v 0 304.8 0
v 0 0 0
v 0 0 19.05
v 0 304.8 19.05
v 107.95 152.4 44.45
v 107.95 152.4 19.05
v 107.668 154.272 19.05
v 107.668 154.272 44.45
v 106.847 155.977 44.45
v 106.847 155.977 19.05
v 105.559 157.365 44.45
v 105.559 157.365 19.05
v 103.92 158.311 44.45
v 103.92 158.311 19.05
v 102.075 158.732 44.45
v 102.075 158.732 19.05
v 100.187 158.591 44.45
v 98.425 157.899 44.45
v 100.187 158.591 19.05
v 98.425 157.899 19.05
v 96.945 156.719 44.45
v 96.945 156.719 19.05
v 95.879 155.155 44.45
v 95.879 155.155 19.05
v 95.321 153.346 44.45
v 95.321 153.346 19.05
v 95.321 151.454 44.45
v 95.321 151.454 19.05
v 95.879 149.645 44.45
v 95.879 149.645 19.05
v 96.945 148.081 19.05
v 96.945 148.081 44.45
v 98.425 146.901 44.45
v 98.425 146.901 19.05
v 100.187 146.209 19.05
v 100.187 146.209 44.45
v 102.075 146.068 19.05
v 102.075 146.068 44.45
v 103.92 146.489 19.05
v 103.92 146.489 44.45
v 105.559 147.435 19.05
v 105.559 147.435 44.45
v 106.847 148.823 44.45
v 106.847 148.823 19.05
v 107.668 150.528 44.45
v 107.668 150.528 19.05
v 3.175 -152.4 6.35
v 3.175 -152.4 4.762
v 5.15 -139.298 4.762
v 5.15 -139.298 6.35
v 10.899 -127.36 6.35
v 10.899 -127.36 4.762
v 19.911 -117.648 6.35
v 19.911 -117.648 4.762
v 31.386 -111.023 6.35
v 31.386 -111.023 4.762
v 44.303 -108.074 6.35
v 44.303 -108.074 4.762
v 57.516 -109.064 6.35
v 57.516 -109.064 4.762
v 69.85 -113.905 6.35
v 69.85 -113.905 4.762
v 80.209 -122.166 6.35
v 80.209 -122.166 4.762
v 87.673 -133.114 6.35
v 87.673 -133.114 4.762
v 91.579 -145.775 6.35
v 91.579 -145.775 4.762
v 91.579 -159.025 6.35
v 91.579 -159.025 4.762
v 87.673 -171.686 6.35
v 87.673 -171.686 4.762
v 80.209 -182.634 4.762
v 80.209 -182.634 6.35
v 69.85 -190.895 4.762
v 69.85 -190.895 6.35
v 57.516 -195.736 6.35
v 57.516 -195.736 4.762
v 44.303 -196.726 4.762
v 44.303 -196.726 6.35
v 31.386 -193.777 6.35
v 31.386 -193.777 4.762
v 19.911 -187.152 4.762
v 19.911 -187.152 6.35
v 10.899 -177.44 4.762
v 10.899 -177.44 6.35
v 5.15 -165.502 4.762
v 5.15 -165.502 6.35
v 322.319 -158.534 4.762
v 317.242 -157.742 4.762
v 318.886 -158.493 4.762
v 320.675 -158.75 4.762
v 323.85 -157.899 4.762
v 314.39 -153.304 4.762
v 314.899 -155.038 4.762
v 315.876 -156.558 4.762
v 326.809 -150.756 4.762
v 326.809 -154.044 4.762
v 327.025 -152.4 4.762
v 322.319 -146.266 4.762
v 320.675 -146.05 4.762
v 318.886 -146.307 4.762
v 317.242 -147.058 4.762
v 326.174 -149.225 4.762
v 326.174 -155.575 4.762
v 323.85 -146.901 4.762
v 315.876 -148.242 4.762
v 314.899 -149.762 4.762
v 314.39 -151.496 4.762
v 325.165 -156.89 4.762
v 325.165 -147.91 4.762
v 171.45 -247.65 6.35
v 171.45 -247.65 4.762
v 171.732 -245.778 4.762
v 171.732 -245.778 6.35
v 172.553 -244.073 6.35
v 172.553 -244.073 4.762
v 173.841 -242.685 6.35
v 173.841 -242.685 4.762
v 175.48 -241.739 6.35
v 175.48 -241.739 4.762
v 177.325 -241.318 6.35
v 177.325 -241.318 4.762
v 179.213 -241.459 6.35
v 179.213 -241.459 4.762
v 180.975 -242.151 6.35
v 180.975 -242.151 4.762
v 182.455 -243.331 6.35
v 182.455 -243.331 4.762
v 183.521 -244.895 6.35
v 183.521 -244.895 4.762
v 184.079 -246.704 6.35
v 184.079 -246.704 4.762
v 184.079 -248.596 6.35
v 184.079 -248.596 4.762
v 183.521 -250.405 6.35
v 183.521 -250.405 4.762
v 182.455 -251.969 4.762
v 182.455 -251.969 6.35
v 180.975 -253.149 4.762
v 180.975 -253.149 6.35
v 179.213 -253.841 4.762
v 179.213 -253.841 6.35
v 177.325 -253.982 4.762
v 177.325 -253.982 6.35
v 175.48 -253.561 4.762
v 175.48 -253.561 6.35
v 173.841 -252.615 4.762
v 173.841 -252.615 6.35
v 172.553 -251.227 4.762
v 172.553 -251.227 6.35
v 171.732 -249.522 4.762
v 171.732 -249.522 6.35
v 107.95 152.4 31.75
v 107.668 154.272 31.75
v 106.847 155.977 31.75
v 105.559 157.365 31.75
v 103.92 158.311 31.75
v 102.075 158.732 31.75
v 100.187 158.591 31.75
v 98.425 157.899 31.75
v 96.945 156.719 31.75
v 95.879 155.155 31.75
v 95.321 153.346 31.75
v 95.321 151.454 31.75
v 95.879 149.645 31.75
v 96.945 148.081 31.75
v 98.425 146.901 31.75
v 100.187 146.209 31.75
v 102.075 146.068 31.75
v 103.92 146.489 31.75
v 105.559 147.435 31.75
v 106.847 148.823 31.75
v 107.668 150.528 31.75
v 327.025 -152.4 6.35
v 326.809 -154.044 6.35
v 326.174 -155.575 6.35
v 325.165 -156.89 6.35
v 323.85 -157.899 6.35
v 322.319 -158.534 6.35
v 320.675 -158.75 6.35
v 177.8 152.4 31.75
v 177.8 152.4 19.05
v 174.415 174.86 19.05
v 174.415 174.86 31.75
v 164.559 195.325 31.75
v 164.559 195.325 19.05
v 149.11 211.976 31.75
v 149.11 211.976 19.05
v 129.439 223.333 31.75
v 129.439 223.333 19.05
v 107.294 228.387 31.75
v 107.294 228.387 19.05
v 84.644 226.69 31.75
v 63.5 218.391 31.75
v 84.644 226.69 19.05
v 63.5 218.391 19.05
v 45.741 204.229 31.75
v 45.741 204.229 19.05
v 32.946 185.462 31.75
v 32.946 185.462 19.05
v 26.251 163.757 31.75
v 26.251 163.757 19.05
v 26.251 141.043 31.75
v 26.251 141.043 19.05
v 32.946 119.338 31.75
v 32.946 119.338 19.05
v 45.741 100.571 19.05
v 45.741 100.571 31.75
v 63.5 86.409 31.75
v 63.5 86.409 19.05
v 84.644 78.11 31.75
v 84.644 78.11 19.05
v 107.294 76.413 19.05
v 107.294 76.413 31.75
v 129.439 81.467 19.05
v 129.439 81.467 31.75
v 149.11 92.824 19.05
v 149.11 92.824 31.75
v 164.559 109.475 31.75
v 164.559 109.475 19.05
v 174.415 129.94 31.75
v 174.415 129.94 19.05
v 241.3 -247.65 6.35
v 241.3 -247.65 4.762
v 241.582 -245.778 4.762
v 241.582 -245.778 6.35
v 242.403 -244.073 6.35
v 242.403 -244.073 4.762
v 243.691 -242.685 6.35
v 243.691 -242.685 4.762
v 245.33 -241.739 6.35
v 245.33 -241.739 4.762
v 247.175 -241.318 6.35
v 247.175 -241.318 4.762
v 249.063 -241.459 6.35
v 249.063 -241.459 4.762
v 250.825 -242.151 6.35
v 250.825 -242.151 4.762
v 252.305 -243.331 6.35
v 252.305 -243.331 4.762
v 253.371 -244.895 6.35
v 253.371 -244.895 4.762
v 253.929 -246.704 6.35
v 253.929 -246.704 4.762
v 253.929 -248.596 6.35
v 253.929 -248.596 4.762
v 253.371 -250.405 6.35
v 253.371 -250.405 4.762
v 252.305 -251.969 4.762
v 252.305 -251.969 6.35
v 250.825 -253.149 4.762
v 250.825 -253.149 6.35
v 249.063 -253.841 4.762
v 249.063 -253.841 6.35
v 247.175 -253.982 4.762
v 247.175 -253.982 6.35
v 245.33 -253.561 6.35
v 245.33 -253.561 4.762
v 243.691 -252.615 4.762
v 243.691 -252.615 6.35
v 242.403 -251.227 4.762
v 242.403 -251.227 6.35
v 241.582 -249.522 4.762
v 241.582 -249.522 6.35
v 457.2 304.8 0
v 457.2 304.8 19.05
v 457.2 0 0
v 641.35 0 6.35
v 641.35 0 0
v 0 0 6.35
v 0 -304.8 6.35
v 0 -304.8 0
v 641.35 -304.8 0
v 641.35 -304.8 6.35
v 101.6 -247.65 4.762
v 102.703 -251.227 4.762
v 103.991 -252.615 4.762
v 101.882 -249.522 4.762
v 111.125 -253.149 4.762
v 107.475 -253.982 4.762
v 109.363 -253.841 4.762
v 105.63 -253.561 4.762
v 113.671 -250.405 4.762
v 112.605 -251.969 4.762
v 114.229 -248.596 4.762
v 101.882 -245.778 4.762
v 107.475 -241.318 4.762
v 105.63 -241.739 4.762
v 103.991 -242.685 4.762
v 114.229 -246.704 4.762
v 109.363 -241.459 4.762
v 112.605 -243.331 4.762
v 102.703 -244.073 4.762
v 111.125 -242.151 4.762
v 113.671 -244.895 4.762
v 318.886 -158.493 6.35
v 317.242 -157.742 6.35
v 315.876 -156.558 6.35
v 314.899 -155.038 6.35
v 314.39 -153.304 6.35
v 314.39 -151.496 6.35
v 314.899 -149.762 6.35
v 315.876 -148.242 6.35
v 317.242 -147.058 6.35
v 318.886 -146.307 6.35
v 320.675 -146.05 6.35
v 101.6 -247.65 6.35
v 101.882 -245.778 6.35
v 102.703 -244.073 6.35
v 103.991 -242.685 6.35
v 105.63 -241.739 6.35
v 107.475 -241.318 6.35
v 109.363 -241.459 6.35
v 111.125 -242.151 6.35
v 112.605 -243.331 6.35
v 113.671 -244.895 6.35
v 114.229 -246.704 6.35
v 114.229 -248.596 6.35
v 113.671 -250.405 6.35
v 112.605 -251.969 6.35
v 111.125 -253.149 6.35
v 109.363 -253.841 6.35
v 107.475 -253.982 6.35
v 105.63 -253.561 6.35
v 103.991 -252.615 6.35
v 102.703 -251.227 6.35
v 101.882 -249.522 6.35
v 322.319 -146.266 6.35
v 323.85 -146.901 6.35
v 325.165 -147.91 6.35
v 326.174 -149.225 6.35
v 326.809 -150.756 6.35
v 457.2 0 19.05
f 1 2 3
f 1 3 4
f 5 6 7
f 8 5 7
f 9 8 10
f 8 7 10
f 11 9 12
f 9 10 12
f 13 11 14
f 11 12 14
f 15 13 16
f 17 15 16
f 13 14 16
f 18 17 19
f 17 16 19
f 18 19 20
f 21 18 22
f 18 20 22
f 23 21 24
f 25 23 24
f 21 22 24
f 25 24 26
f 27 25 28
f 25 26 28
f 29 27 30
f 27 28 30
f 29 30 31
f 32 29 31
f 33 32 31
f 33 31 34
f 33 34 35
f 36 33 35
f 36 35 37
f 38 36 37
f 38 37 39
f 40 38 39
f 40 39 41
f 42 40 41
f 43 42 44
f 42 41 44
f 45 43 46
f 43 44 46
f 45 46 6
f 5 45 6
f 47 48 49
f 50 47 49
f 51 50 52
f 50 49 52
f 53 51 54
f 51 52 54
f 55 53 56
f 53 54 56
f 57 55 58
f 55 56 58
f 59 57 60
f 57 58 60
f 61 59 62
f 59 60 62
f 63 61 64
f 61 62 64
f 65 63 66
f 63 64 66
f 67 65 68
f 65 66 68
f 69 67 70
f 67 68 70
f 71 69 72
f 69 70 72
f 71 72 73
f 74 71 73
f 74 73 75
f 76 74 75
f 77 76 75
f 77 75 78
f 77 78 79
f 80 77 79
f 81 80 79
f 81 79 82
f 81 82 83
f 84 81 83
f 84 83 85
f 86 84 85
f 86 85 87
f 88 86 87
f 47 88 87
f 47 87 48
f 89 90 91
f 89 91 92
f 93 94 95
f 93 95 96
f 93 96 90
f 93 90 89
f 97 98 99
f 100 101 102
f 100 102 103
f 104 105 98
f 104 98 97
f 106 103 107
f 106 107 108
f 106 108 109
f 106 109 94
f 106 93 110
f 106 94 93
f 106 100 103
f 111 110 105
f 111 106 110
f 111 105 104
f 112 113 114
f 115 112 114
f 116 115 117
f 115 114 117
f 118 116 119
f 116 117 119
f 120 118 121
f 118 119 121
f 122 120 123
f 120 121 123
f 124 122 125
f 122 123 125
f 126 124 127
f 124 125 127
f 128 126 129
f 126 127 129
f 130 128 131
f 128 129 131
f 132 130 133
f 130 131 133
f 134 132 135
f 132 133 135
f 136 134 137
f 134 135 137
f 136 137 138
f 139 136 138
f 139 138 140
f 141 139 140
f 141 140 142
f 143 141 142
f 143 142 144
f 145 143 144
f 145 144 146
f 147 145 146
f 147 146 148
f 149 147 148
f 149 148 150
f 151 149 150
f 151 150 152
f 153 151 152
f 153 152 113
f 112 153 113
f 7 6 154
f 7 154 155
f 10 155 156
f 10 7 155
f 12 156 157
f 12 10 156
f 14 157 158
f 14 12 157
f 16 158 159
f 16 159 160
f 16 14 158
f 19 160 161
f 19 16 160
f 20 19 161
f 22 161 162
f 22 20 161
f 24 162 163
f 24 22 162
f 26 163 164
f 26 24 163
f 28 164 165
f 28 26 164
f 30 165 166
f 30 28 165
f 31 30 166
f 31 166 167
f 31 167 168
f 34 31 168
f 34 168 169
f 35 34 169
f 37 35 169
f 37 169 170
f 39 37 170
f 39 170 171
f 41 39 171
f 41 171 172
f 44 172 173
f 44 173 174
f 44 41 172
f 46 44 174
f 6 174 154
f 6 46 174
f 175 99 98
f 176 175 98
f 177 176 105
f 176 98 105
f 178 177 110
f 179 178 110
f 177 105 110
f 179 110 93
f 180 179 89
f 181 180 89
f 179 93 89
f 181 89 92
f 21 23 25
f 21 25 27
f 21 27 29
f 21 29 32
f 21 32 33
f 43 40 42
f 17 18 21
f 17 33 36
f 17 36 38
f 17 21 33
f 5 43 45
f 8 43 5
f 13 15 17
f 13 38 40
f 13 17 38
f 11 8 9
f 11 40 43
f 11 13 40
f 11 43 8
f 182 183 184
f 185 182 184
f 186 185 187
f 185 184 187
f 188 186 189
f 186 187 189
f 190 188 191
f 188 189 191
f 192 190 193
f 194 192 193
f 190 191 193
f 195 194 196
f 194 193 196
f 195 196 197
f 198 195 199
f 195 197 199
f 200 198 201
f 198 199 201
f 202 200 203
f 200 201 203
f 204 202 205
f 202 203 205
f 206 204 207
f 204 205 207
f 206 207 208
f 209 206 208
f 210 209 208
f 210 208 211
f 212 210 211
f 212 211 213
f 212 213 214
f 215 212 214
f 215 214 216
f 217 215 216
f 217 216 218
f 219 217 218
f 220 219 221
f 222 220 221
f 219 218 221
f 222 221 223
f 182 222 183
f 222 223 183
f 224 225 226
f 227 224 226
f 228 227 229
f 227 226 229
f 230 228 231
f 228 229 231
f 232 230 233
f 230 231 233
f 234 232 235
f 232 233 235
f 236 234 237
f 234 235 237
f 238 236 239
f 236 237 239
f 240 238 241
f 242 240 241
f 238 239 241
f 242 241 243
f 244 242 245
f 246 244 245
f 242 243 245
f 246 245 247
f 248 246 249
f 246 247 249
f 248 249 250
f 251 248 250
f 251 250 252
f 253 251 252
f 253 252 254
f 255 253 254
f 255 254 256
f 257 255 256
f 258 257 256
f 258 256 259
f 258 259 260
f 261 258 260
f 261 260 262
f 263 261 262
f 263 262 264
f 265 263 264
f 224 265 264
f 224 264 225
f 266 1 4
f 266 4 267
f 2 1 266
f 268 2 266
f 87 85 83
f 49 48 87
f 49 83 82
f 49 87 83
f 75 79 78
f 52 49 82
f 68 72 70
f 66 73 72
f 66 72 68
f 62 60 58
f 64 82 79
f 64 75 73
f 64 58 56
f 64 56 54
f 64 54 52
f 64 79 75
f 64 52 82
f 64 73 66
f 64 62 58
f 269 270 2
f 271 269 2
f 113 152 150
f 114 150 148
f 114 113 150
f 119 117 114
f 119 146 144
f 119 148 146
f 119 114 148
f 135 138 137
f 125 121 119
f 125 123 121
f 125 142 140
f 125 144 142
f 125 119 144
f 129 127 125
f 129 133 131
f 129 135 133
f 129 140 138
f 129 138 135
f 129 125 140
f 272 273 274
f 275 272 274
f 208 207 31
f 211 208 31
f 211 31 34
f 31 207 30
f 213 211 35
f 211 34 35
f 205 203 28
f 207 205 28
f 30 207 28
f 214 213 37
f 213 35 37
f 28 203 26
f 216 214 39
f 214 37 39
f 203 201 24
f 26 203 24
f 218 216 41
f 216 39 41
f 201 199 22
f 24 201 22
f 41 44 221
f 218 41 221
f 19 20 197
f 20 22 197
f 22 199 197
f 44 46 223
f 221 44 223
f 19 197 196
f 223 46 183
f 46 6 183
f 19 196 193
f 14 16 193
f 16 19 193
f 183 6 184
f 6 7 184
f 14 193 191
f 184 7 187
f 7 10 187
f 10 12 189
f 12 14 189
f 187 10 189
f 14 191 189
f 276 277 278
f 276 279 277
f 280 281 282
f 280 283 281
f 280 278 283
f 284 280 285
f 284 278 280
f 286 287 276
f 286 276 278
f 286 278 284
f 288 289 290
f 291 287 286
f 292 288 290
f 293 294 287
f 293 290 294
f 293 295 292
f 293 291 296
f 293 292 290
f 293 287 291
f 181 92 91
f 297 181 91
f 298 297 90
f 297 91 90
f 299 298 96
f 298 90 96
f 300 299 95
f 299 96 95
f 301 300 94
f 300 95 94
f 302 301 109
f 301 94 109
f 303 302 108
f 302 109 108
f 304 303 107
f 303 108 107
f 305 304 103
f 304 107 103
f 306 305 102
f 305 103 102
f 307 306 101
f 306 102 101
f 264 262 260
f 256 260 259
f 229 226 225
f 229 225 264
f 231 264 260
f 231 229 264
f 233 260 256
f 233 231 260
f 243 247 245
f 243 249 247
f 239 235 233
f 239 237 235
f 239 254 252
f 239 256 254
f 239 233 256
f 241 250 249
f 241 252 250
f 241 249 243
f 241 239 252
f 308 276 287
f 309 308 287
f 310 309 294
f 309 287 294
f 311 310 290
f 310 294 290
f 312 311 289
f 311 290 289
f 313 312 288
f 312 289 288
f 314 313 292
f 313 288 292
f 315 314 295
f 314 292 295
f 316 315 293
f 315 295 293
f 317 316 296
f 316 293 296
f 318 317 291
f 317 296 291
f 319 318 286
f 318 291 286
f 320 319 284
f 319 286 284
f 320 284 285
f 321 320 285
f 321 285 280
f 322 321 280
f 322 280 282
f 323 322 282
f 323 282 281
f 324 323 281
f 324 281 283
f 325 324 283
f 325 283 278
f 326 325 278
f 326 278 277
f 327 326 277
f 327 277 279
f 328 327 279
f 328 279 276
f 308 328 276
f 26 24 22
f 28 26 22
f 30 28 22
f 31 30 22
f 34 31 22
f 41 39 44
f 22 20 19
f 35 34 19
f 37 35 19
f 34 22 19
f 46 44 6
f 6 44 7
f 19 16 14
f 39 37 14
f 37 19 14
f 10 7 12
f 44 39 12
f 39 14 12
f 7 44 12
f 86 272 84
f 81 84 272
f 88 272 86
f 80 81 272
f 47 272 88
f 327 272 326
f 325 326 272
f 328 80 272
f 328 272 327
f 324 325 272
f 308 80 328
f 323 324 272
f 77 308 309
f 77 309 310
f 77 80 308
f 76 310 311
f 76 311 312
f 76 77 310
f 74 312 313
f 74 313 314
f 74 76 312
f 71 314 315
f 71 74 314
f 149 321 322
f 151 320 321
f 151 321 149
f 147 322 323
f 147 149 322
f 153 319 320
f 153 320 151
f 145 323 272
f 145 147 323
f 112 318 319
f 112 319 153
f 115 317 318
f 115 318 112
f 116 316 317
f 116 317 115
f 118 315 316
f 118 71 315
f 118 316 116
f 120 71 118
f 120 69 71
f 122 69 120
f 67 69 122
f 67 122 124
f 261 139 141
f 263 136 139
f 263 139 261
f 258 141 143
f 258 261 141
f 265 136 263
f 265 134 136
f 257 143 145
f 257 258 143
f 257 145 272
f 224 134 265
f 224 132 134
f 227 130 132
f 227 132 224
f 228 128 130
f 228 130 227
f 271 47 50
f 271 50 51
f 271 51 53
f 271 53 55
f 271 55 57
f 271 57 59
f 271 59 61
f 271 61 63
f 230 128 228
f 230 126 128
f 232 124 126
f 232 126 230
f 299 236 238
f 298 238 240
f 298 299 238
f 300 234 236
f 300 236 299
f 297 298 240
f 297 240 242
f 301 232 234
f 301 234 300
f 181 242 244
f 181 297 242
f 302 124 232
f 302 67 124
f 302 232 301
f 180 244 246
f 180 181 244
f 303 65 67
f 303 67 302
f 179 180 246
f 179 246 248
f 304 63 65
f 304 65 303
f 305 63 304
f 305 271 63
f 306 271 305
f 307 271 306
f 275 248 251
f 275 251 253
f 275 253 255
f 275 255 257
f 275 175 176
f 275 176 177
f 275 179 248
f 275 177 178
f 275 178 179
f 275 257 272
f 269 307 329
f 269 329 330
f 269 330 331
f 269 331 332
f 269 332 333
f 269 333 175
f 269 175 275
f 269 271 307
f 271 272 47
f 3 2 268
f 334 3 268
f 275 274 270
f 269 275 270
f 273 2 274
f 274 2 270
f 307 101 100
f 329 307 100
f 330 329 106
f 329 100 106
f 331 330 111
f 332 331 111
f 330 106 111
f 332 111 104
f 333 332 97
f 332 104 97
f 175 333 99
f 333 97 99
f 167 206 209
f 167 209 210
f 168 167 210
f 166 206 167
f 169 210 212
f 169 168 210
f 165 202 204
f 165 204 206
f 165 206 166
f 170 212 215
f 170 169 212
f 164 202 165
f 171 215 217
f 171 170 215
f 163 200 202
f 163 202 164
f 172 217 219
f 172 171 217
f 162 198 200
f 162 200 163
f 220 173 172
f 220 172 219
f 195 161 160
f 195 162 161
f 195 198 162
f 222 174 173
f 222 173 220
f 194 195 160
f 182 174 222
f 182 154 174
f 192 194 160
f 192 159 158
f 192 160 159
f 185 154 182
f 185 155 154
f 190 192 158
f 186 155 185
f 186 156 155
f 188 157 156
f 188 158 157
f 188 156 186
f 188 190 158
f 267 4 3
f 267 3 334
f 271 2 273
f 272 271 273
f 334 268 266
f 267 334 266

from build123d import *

# Parameters (mm, degrees)
F0_W     = 457.2
F0_H     = 304.8
F1_DEPTH = 19.05
F2_R     = 76.2
F2_R_2   = 6.35
F3_DEPTH = 12.7
F4_DEPTH = 25.4
F6_DEPTH = 6.35
F7_DEPTH = 4.7625


with BuildPart() as f1:
    # F0 (on Top) → F1 (new body)
    with BuildSketch(Plane.XY):
        with Locations((228.6, 152.4)):
            Rectangle(F0_W, F0_H)
    extrude(amount=F1_DEPTH)


with BuildPart() as f3:
    # F2 (on face) → F3 (new body)
    with BuildSketch(Plane.XY.offset(19.05)):
        with Locations((101.6, 152.4)):
            Circle(F2_R)
        with Locations((101.6, 152.4)):
            Circle(F2_R_2, mode=Mode.SUBTRACT)
    extrude(amount=F3_DEPTH)


with BuildPart() as f4:
    # F2 (on face) → F4 (new body)
    with BuildSketch(Plane.XY.offset(19.05)):
        with Locations((101.6, 152.4)):
            Circle(F2_R_2)
    extrude(amount=F4_DEPTH)


with BuildPart() as f6:
    # F5 (on Top) → F6 (new body)
    with BuildSketch(Plane.XY):
        with BuildLine():
            Line((641.35, 0), (320.675, 0))
            Line((320.675, 0), (320.675, -16.5491942316))
            Line((320.675, -16.5491942316), (320.675, -146.05))
            ThreePointArc((320.675, -146.05), (325.1651280605, -147.9098719395), (327.025, -152.4))
            ThreePointArc((327.025, -152.4), (325.1651280605, -156.8901280605), (320.675, -158.75))
            Line((320.675, -158.75), (320.675, -247.65))
            Line((320.675, -247.65), (320.675, -304.8))
            Line((320.675, -304.8), (641.35, -304.8))
            Line((641.35, -304.8), (641.35, 0))
        make_face()
        with BuildLine():
            Line((320.675, 0), (0, 0))
            Line((0, 0), (0, -81.5177187324))
            Line((0, -81.5177187324), (0, -152.4))
            Line((0, -152.4), (0, -247.65))
            Line((0, -247.65), (101.6, -247.65))
            ThreePointArc((101.6, -247.65), (107.95, -241.3), (114.3, -247.65))
            Line((114.3, -247.65), (171.45, -247.65))
            ThreePointArc((171.45, -247.65), (177.8, -241.3), (184.15, -247.65))
            Line((184.15, -247.65), (241.3, -247.65))
            ThreePointArc((241.3, -247.65), (247.65, -241.3), (254, -247.65))
            Line((254, -247.65), (320.675, -247.65))
            Line((320.675, -247.65), (320.675, -158.75))
            ThreePointArc((320.675, -158.75), (314.325, -152.4), (320.675, -146.05))
            Line((320.675, -146.05), (320.675, -16.5491942316))
            Line((320.675, -16.5491942316), (320.675, 0))
        make_face()
        with BuildLine():
            ThreePointArc((92.075, -152.4), (47.625, -196.85), (3.175, -152.4))
            ThreePointArc((3.175, -152.4), (47.625, -107.95), (92.075, -152.4))
        make_face(mode=Mode.SUBTRACT)
        with BuildLine():
            Line((101.6, -247.65), (0, -247.65))
            Line((0, -247.65), (0, -304.8))
            Line((0, -304.8), (320.675, -304.8))
            Line((320.675, -304.8), (320.675, -247.65))
            Line((320.675, -247.65), (254, -247.65))
            ThreePointArc((254, -247.65), (247.65, -254), (241.3, -247.65))
            Line((241.3, -247.65), (184.15, -247.65))
            ThreePointArc((184.15, -247.65), (177.8, -254), (171.45, -247.65))
            Line((171.45, -247.65), (114.3, -247.65))
            ThreePointArc((114.3, -247.65), (107.95, -254), (101.6, -247.65))
        make_face()
    extrude(amount=F6_DEPTH)

    # F5 (on Top) → F7 (join)
    with BuildSketch(Plane.XY):
        with BuildLine():
            ThreePointArc((92.075, -152.4), (47.625, -107.95), (3.175, -152.4))
            ThreePointArc((3.175, -152.4), (47.625, -196.85), (92.075, -152.4))
        make_face()
        with BuildLine():
            Line((107.95, -247.65), (101.6, -247.65))
            ThreePointArc((101.6, -247.65), (107.95, -254), (114.3, -247.65))
            Line((114.3, -247.65), (107.95, -247.65))
        make_face()
        with BuildLine():
            ThreePointArc((114.3, -247.65), (107.95, -241.3), (101.6, -247.65))
            Line((101.6, -247.65), (107.95, -247.65))
            Line((107.95, -247.65), (114.3, -247.65))
        make_face()
        with BuildLine():
            Line((177.8, -247.65), (171.45, -247.65))
            ThreePointArc((171.45, -247.65), (177.8, -254), (184.15, -247.65))
            Line((184.15, -247.65), (177.8, -247.65))
        make_face()
        with BuildLine():
            ThreePointArc((184.15, -247.65), (177.8, -241.3), (171.45, -247.65))
            Line((171.45, -247.65), (177.8, -247.65))
            Line((177.8, -247.65), (184.15, -247.65))
        make_face()
        with BuildLine():
            ThreePointArc((241.3, -247.65), (247.65, -254), (254, -247.65))
            Line((254, -247.65), (247.65, -247.65))
            Line((247.65, -247.65), (241.3, -247.65))
        make_face()
        with BuildLine():
            Line((247.65, -247.65), (254, -247.65))
            ThreePointArc((254, -247.65), (247.65, -241.3), (241.3, -247.65))
            Line((241.3, -247.65), (247.65, -247.65))
        make_face()
        with BuildLine():
            ThreePointArc((327.025, -152.4), (325.1651280605, -147.9098719395), (320.675, -146.05))
            Line((320.675, -146.05), (320.675, -152.4))
            Line((320.675, -152.4), (320.675, -158.75))
            ThreePointArc((320.675, -158.75), (325.1651280605, -156.8901280605), (327.025, -152.4))
        make_face()
        with BuildLine():
            Line((320.675, -152.4), (320.675, -146.05))
            ThreePointArc((320.675, -146.05), (314.325, -152.4), (320.675, -158.75))
            Line((320.675, -158.75), (320.675, -152.4))
        make_face()
    extrude(amount=F7_DEPTH)


solid = Compound([f1.part, f3.part, f4.part, f6.part])
